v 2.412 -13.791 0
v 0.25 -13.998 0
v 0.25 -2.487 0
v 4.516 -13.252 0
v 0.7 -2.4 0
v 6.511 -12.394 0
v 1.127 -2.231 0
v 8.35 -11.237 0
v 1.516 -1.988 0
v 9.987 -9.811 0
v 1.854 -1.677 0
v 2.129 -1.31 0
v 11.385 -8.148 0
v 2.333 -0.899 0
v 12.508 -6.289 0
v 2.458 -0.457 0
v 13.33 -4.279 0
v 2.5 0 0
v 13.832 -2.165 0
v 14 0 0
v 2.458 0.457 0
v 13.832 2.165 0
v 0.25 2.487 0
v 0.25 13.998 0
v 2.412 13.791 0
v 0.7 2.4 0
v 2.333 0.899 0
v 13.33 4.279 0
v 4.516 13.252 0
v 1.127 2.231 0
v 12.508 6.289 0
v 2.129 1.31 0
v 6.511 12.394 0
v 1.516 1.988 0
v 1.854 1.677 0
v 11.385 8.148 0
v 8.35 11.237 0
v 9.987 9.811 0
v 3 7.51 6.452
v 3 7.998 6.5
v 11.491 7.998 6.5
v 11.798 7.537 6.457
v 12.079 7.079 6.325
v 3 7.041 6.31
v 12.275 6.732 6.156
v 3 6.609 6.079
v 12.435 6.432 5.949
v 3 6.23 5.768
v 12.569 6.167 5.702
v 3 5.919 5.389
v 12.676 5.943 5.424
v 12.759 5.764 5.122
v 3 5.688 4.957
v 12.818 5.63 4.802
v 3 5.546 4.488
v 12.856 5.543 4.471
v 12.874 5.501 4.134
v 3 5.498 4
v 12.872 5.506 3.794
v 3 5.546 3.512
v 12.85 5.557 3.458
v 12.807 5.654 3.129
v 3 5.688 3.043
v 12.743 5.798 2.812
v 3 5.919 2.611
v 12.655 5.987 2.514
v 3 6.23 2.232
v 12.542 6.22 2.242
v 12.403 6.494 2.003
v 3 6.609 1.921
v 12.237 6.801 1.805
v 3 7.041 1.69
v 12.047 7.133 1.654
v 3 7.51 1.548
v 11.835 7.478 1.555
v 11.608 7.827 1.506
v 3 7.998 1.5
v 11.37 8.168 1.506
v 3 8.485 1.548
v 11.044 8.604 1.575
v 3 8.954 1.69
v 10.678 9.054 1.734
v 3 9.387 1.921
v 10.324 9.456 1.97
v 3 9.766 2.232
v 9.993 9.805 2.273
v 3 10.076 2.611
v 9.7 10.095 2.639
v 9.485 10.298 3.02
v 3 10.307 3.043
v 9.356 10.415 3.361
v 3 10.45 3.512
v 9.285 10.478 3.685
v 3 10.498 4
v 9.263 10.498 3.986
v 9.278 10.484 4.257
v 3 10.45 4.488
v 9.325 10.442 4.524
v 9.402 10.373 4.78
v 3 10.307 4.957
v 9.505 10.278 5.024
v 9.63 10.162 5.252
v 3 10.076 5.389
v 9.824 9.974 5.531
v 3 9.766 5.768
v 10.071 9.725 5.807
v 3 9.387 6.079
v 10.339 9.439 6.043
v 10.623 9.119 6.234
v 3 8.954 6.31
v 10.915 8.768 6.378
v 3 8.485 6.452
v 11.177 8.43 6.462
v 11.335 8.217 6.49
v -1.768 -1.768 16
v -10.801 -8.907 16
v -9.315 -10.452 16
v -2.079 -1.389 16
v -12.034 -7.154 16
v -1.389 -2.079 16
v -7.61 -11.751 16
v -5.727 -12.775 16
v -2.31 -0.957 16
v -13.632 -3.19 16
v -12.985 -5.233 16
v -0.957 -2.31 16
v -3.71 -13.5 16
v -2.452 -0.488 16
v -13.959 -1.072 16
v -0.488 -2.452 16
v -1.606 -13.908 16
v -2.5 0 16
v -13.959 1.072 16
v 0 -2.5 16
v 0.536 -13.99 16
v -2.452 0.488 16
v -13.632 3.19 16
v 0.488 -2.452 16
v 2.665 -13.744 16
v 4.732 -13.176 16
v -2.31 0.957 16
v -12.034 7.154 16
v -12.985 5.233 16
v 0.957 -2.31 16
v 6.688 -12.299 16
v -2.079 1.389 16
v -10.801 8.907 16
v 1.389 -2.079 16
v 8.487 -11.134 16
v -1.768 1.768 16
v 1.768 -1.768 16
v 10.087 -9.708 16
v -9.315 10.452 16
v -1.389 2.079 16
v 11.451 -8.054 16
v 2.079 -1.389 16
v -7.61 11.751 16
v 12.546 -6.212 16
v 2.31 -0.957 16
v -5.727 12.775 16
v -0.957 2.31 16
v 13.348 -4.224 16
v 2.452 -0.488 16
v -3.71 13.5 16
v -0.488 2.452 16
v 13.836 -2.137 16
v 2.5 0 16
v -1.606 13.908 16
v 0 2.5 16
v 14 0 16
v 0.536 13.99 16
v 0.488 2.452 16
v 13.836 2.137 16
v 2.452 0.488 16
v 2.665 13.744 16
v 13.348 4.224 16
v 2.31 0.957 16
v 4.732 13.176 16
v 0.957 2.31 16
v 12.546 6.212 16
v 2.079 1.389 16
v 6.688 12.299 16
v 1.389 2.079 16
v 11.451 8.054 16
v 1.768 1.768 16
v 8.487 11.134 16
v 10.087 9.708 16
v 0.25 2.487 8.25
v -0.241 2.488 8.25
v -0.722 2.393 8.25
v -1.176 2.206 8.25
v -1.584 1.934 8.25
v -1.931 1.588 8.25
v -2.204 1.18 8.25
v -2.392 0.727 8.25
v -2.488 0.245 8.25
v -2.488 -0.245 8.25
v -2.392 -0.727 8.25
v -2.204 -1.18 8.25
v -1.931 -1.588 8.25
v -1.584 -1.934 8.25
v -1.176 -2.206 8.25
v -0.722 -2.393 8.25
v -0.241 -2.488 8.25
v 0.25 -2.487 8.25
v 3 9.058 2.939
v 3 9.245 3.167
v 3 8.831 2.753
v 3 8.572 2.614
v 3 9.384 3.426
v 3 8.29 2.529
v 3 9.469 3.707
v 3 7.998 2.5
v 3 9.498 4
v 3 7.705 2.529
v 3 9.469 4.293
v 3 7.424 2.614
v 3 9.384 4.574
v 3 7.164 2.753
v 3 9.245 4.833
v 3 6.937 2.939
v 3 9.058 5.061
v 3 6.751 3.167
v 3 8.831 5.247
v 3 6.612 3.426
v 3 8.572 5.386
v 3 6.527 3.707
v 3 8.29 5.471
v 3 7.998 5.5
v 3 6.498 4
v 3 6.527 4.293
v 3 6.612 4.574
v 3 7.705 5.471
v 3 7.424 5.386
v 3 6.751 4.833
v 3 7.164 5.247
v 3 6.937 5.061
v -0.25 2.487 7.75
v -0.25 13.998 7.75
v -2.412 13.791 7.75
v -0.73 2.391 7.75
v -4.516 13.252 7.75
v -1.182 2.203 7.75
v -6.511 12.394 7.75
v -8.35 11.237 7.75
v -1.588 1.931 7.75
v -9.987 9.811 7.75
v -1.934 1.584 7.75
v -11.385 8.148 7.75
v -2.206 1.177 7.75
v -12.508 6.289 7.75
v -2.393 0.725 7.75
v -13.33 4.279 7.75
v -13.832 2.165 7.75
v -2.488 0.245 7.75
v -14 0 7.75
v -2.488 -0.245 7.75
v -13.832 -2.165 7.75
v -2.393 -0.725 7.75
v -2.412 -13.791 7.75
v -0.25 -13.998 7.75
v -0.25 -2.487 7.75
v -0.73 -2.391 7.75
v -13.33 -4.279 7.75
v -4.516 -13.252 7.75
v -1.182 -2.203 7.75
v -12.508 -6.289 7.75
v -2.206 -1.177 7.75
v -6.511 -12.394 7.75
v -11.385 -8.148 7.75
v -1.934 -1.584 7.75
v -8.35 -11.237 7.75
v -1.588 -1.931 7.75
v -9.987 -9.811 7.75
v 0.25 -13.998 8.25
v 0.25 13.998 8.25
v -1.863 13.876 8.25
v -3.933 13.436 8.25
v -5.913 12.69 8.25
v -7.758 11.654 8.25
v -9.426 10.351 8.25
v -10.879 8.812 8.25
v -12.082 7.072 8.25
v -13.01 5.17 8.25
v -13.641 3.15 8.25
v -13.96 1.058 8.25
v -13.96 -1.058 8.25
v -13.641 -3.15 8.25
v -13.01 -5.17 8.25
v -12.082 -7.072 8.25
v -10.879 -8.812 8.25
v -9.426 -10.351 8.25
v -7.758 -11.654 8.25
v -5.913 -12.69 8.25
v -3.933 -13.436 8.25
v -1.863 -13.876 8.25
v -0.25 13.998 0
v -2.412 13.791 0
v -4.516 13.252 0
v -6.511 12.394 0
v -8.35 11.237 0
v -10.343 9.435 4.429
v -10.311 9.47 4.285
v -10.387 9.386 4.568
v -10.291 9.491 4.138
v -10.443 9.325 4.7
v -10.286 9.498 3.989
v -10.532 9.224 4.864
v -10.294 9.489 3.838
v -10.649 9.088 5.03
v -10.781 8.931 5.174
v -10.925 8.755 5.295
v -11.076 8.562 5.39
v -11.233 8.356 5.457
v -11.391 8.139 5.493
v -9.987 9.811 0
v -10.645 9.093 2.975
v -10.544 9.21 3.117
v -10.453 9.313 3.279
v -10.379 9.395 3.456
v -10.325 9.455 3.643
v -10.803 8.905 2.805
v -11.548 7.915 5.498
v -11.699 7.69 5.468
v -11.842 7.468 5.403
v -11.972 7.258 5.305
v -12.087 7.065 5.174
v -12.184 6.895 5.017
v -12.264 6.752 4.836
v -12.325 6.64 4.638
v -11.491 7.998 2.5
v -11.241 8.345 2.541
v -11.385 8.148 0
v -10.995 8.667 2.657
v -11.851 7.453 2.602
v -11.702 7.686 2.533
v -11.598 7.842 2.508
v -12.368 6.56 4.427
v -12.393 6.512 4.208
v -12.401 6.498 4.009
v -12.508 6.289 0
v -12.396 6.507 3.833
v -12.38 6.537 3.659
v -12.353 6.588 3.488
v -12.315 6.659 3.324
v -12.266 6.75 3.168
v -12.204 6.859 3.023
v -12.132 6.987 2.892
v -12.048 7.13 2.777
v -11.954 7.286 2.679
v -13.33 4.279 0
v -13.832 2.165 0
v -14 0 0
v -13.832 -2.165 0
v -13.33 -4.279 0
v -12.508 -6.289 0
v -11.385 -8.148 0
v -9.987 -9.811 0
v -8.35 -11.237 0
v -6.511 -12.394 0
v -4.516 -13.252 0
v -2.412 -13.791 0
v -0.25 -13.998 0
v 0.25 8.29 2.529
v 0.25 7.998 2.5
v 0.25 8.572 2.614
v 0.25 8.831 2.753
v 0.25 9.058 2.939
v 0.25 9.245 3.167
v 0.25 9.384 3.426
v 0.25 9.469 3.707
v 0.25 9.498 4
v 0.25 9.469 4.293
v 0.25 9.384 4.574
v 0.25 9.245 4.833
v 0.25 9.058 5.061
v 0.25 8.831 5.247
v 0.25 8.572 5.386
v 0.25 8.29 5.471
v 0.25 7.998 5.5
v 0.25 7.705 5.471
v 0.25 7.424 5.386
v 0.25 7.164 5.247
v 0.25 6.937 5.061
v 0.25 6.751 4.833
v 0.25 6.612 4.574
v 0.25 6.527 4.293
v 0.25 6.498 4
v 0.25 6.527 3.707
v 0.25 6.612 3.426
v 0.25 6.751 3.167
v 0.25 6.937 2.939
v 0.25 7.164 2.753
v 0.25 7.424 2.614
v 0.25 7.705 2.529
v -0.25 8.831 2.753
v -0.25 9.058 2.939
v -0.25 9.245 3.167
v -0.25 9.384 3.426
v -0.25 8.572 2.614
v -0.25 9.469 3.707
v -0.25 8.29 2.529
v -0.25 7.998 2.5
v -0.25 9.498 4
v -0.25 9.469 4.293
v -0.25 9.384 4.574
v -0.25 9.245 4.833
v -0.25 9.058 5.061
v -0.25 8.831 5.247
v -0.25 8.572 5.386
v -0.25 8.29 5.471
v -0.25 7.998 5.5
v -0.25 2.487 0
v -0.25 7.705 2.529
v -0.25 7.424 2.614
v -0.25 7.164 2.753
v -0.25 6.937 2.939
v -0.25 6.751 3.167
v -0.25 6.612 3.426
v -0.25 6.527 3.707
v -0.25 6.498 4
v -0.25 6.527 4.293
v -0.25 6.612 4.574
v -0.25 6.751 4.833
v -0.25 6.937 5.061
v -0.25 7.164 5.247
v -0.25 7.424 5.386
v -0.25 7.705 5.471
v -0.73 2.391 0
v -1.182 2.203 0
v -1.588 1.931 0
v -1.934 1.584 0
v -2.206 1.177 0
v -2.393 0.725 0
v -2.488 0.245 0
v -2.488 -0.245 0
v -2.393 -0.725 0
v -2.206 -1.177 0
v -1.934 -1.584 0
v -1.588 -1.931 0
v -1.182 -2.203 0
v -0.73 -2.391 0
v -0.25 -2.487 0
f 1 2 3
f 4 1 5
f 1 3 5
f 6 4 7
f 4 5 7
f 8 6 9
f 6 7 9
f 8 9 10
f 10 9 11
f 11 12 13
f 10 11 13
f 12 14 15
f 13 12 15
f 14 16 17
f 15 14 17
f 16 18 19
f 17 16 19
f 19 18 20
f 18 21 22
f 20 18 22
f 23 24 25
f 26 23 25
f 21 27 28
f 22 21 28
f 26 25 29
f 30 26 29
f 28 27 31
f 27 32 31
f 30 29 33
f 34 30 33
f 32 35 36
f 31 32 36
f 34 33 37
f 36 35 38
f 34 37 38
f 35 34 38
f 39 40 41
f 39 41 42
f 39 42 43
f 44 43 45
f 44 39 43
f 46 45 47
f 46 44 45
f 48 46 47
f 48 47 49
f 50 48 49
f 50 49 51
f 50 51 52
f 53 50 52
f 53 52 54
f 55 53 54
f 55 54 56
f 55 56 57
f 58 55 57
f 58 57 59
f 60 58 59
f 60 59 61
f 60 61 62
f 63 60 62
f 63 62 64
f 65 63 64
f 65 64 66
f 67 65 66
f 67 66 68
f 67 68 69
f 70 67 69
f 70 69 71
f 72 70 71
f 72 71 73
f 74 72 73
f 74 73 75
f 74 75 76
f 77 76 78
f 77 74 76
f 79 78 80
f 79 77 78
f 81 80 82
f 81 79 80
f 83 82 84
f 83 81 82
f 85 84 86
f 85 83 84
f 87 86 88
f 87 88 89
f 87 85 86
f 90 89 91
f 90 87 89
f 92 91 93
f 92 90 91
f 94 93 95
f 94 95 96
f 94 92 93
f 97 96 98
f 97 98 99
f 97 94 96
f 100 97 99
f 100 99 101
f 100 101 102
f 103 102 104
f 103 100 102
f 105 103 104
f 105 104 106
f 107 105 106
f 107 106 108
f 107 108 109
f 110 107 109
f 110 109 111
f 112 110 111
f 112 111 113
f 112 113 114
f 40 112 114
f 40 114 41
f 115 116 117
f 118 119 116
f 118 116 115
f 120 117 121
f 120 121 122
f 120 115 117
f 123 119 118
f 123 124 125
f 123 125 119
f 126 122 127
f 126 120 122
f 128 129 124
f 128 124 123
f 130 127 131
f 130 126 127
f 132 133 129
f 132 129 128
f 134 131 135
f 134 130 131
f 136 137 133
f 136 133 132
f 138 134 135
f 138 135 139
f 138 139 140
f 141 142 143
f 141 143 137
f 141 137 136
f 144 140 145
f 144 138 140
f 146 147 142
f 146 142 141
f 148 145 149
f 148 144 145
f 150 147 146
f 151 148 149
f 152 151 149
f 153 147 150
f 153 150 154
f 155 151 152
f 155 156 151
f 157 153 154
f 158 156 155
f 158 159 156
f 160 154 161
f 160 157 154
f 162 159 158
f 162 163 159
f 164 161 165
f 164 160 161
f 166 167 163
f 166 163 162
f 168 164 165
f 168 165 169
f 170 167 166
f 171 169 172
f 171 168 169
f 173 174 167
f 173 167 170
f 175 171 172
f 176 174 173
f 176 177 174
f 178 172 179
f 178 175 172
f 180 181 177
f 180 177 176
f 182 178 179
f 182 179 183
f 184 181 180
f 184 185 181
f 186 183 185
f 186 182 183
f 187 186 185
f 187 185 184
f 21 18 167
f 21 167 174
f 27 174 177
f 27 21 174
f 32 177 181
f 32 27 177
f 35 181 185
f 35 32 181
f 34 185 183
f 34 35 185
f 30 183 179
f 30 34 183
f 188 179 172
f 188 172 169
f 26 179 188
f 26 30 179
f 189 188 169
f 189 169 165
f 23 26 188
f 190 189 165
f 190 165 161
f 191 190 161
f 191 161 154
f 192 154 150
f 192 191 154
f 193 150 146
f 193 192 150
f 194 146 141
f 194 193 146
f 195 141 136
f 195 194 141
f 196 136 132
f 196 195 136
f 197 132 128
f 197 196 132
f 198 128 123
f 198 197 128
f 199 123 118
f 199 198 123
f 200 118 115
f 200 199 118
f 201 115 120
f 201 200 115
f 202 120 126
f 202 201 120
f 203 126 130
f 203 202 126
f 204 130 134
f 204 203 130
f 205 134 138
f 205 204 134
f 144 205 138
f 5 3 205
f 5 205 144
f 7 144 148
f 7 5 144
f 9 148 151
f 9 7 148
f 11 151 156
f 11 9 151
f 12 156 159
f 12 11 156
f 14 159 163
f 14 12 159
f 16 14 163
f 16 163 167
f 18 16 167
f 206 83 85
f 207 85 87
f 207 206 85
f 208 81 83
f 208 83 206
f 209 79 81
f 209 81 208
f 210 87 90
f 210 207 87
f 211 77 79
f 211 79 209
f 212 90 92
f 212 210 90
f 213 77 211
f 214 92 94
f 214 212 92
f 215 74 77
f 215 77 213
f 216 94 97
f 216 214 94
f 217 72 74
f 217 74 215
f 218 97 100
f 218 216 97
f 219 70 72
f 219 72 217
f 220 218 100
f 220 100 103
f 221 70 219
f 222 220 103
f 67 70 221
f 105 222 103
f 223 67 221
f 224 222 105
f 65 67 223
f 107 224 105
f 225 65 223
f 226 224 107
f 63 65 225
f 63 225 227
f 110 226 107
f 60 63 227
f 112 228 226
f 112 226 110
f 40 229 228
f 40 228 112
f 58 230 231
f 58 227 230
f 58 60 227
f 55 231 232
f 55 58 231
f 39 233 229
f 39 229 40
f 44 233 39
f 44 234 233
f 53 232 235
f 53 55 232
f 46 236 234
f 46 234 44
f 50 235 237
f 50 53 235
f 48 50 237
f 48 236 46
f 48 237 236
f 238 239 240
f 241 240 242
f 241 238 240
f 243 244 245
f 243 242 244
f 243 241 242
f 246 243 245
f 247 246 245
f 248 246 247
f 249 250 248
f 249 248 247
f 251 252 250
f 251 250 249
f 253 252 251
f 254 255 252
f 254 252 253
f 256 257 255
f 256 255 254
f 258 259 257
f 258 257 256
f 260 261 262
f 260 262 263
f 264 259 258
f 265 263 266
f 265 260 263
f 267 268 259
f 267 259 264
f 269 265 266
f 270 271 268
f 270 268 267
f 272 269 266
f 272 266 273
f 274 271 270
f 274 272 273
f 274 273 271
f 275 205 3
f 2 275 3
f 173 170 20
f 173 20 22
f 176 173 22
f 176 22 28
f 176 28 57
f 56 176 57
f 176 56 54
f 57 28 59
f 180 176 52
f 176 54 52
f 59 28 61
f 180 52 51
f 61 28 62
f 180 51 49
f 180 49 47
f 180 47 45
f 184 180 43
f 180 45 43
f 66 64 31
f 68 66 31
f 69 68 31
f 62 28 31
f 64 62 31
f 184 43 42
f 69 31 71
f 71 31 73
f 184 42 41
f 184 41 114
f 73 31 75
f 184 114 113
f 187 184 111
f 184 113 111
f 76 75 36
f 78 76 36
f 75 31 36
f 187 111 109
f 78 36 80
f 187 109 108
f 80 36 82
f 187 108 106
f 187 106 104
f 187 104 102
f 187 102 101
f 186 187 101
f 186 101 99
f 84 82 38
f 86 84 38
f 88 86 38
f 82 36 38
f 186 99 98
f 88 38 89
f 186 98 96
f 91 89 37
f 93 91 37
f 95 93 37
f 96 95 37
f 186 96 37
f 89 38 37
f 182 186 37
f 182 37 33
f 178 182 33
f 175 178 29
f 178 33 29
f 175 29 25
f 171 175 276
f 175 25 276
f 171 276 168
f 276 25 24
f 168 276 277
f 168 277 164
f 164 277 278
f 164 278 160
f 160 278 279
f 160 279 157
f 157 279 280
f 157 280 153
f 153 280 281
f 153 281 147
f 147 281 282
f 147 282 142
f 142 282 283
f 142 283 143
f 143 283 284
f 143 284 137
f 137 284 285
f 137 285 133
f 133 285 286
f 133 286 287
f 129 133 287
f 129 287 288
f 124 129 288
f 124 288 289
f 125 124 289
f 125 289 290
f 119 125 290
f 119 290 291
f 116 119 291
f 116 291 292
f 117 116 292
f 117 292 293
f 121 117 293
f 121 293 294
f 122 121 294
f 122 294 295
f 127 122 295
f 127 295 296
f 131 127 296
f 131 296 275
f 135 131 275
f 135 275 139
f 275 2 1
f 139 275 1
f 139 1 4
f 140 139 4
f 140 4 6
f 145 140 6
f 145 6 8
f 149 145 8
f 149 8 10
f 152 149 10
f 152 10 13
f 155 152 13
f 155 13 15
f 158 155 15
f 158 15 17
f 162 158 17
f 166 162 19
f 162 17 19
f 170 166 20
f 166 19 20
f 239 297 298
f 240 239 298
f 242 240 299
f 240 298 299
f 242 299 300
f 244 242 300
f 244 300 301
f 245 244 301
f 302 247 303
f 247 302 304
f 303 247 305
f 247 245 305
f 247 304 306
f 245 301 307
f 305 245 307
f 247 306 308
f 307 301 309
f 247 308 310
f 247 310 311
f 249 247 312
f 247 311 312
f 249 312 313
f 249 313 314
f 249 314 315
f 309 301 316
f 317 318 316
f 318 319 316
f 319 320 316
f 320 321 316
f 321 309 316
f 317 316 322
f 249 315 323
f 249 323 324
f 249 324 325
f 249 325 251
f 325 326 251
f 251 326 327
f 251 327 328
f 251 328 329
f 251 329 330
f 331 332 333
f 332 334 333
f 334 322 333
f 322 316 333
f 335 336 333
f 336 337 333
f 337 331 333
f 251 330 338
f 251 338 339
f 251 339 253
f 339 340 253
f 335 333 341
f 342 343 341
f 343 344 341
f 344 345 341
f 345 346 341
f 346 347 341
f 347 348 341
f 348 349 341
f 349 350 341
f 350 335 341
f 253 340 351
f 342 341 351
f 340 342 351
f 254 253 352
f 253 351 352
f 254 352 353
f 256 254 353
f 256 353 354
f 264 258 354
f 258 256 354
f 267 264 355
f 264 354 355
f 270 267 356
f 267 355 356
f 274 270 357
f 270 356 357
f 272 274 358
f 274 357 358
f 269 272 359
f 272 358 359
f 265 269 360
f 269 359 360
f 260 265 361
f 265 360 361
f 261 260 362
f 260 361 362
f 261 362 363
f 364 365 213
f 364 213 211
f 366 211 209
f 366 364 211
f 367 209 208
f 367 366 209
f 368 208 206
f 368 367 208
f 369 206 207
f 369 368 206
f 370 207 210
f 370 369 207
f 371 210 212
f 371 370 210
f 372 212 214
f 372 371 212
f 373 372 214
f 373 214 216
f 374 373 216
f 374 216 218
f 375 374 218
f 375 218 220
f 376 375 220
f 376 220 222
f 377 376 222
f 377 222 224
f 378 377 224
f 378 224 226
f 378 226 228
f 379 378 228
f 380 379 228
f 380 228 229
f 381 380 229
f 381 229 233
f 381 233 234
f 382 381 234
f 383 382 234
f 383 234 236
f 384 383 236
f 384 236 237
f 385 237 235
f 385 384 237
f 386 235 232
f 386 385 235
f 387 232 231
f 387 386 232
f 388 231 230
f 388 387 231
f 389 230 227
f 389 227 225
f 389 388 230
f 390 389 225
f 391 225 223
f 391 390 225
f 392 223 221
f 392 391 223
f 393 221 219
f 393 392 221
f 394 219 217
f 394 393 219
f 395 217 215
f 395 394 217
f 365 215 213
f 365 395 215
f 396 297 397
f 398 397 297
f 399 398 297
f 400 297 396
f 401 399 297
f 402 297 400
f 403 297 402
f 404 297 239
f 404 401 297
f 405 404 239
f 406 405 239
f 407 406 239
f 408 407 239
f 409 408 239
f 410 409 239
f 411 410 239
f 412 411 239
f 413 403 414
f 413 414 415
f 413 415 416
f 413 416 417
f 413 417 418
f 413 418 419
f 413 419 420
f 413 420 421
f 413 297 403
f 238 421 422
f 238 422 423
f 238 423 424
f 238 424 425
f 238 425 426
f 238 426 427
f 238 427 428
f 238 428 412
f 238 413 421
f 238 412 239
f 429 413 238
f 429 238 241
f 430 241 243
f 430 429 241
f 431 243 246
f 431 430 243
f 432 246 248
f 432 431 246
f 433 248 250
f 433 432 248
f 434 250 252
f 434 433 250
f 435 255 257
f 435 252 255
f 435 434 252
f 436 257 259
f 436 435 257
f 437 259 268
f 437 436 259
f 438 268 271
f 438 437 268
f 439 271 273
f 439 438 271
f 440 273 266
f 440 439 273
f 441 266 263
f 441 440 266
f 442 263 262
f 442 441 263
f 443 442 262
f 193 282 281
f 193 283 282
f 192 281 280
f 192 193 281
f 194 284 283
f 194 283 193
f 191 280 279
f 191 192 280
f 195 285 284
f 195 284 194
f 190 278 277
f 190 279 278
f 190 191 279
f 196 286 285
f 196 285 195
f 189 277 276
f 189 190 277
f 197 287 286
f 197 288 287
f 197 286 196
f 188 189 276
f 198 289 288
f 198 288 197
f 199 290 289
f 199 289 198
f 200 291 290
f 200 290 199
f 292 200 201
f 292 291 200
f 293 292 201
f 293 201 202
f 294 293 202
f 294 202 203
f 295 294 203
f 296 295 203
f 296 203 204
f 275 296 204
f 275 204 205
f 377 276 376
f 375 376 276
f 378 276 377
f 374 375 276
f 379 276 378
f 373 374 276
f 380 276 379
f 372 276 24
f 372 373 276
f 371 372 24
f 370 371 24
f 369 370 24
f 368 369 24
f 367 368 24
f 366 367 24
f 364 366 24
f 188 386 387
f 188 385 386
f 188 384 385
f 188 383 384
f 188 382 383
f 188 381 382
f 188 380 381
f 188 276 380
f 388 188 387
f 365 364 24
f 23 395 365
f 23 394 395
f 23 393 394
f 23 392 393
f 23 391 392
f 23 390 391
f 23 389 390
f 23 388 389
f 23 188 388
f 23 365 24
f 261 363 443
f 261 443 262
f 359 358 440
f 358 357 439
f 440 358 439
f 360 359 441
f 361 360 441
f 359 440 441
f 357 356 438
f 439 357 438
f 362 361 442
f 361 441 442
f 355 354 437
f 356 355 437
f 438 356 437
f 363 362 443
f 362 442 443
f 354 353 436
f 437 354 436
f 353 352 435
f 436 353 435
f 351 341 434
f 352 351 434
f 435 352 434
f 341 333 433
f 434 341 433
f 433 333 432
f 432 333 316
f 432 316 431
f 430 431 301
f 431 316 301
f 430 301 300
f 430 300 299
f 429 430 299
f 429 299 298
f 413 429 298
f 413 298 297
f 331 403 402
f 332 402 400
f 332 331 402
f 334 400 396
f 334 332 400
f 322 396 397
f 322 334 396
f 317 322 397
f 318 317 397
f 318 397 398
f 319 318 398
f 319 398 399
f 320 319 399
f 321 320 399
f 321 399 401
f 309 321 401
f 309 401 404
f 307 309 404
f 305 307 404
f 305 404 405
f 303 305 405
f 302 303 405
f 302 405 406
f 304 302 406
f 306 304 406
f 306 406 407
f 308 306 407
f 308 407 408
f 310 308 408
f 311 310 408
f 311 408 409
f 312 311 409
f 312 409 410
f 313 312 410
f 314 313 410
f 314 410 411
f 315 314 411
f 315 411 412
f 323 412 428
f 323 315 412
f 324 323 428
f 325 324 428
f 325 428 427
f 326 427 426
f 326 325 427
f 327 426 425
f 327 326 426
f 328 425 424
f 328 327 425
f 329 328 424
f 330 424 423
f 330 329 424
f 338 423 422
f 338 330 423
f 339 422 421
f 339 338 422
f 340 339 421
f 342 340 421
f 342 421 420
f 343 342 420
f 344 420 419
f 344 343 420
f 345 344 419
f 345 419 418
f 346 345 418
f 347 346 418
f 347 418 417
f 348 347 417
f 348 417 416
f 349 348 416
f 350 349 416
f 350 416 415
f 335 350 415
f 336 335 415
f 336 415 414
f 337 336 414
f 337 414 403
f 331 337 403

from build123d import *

# Parameters (mm, degrees)
SKETCH_1_R               = 14
SKETCH_1_R_2             = 2.5
EXTRUDE_1_DEPTH          = 16
CUT_EXTRUDE_1_DEPTH      = 26.455844123
CUT_EXTRUDE_1_DEPTH_BACK = 26.455844123
CUT_EXTRUDE_2_DEPTH      = 26.455844123
CUT_EXTRUDE_2_DEPTH_BACK = 26.455844123
SKETCH_3_R               = 1.5
CUT_EXTRUDE_START        = 3
SKETCH_3_4_R             = 2.5
SKETCH_3_4_R_2           = 1.5
CUT_EXTRUDE_3_DEPTH      = 23.455844296


with BuildPart() as part:
    # 草图1 → 凸台-拉伸1 (new body)
    with BuildSketch(Plane.XY):
        Circle(SKETCH_1_R)
        Circle(SKETCH_1_R_2, mode=Mode.SUBTRACT)
    extrude(amount=EXTRUDE_1_DEPTH)

    # 草图2 → 切除-拉伸1 (cut, two sides: drawn at the far end of the back side and taken through both)
    with BuildSketch(Plane(origin=(0, 0, 0), x_dir=(1, 0, 0), z_dir=(0, 1, 0)).offset(-CUT_EXTRUDE_1_DEPTH_BACK)):
        Polygon((-14, -7.75), (-14, -8.25), (0.25, -8.25), (0.25, 0), (-0.25, 0), (-0.25, -7.75), align=None)
    extrude(amount=CUT_EXTRUDE_1_DEPTH + CUT_EXTRUDE_1_DEPTH_BACK, mode=Mode.SUBTRACT)


with BuildPart() as cut_extrude_1_piece_1:
    # of the separate pieces the step leaves, piece 1, a body of its own (cut_extrude_1_pieces)
    add(part.part.solids().sort_by_distance((14, 0, 0))[0])


with BuildPart() as cut_extrude_1_piece_2:
    # of the separate pieces the step leaves, piece 2, a body of its own (cut_extrude_1_pieces)
    add(part.part.solids().sort_by_distance((-0.25, 13.997767679, 0))[0])


with BuildPart() as cut_extrude_2_tool:
    # 草图3 → 切除-拉伸2 (new, two sides: drawn at the far end of the back side and taken through both)
    with BuildSketch(Plane(origin=(0, 0, 0), x_dir=(0, 0, -1), z_dir=(1, 0, 0)).offset(-CUT_EXTRUDE_2_DEPTH_BACK)):
        with Locations((-4, 7.997767679)):
            Circle(SKETCH_3_R)
    extrude(amount=CUT_EXTRUDE_2_DEPTH + CUT_EXTRUDE_2_DEPTH_BACK)


with BuildPart() as cut_extrude_1_piece_1_1:
    add(cut_extrude_1_piece_1.part)

    # 切除-拉伸2: cut by cut_extrude_2_tool
    add(cut_extrude_2_tool.part, mode=Mode.SUBTRACT)

    # 草图3<4> → 切除-拉伸3 (cut, through all)
    with BuildSketch(Plane(origin=(0, 0, 0), x_dir=(0, 0, -1), z_dir=(1, 0, 0)).offset(CUT_EXTRUDE_START)):
        with Locations((-4, 7.997767679)):
            Circle(SKETCH_3_4_R)
        with Locations((-4, 7.997767679)):
            Circle(SKETCH_3_4_R_2, mode=Mode.SUBTRACT)
    extrude(amount=CUT_EXTRUDE_3_DEPTH, mode=Mode.SUBTRACT)


with BuildPart() as cut_extrude_1_piece_2_1:
    add(cut_extrude_1_piece_2.part)

    # 切除-拉伸2: cut by cut_extrude_2_tool
    add(cut_extrude_2_tool.part, mode=Mode.SUBTRACT)


solid = Compound([cut_extrude_1_piece_1_1.part, cut_extrude_1_piece_2_1.part])
